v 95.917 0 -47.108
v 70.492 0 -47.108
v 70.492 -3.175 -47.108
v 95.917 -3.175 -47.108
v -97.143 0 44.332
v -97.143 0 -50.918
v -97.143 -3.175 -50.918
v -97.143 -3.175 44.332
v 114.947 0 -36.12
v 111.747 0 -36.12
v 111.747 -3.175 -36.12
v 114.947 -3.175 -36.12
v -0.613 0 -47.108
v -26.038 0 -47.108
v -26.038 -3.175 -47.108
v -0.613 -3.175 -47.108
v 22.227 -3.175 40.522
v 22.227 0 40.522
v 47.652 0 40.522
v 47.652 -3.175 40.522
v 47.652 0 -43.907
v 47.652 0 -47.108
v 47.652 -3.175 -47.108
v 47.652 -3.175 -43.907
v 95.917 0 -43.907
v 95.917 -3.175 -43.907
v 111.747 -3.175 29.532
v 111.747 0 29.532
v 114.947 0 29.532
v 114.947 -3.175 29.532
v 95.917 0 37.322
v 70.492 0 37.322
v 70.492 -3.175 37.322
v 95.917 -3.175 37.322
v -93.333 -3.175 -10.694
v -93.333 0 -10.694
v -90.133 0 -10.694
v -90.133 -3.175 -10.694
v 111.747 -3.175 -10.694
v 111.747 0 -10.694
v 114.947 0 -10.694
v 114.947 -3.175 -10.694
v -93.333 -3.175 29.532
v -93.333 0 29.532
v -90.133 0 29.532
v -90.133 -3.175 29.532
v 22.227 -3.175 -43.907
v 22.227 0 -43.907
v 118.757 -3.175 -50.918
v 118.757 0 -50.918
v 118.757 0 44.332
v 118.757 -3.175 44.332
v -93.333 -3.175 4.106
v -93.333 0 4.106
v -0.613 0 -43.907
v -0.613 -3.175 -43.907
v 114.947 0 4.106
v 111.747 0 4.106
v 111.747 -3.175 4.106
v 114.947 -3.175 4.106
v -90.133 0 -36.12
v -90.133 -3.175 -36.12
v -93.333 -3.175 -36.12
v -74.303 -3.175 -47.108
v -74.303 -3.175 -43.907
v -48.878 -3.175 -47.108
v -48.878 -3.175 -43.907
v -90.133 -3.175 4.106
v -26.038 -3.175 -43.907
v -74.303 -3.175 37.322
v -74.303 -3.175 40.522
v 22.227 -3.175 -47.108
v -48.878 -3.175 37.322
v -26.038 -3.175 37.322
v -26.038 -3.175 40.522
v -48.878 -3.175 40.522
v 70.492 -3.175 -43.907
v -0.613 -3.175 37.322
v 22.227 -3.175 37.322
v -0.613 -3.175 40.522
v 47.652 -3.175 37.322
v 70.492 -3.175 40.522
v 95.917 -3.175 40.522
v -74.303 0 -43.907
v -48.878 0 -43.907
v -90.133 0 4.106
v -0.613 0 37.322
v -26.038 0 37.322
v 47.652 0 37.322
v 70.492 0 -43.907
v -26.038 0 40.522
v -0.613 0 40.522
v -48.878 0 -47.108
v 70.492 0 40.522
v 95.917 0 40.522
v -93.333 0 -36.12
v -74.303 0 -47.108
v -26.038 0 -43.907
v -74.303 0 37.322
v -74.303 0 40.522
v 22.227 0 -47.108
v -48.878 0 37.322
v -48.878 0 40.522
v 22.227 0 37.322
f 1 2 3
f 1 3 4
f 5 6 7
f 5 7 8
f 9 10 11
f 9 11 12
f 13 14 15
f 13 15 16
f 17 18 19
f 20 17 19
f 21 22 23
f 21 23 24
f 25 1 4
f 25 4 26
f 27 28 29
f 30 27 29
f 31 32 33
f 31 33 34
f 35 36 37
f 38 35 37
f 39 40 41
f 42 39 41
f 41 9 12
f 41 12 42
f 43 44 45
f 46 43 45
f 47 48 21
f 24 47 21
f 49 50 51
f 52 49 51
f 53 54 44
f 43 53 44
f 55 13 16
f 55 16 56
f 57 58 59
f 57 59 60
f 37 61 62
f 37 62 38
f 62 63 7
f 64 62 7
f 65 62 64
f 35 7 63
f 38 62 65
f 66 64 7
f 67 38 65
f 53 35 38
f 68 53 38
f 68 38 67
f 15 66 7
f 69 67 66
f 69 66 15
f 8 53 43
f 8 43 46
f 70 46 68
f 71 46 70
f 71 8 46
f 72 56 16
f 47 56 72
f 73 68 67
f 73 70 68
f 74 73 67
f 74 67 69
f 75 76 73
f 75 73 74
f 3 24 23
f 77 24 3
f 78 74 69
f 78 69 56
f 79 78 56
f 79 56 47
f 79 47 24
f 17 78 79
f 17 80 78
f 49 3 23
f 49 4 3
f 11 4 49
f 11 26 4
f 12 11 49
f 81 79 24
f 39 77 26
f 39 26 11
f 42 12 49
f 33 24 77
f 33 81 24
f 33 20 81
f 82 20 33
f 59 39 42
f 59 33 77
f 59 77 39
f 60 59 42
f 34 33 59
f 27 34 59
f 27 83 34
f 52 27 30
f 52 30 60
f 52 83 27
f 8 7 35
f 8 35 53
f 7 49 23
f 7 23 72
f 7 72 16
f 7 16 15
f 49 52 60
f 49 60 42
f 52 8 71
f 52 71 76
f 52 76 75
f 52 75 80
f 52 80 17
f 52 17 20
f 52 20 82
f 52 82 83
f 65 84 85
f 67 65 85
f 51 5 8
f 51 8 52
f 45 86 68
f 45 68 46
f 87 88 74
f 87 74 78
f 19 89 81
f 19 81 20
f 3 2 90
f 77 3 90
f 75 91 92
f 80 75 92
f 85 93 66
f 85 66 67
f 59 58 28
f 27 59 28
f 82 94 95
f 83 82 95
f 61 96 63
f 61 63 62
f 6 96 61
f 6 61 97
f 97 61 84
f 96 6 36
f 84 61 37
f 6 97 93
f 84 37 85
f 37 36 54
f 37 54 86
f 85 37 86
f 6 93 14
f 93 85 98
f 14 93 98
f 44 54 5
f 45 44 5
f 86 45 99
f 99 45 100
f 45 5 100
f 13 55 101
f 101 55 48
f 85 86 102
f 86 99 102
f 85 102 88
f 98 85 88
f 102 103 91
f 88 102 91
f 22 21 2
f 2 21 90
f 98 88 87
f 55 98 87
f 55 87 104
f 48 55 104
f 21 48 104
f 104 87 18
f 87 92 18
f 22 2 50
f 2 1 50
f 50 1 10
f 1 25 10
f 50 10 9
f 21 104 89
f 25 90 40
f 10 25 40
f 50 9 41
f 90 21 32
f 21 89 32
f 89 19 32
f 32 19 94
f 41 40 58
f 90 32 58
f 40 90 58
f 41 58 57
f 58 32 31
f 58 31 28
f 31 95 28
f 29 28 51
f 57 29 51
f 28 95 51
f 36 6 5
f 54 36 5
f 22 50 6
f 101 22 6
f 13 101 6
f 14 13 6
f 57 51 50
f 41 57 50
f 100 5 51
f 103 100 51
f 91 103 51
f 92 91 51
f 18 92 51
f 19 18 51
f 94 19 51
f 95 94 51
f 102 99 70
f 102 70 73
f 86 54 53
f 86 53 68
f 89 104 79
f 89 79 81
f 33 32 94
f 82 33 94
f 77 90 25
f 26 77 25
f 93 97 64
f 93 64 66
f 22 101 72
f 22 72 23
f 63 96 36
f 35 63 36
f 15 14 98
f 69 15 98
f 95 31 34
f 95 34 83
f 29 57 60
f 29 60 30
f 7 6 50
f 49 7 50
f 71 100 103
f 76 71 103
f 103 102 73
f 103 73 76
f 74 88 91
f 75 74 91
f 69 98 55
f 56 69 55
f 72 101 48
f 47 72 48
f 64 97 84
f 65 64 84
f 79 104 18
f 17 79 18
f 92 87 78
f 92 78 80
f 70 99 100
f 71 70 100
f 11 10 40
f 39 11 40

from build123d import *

# Parameters (mm, degrees)
F0_W     = 215.9
F0_H     = 95.25
F0_W_2   = 25.4254
F0_H_2   = 3.2004
F0_W_3   = 3.2004
F0_H_3   = 25.4254
F1_DEPTH = 3.175


with BuildPart() as f1:
    # F0 (on Front) → F1 (new body)
    with BuildSketch(Plane.XZ):
        with Locations((10.806967, -3.292766)):
            Rectangle(F0_W, F0_H)
        with Locations((-61.590653, -45.507566)):
            Rectangle(F0_W_2, F0_H_2, mode=Mode.SUBTRACT)
        with Locations((-13.325573, -45.507566)):
            Rectangle(F0_W_2, F0_H_2, mode=Mode.SUBTRACT)
        with Locations((-91.732833, -23.407026)):
            Rectangle(F0_W_3, F0_H_3, mode=Mode.SUBTRACT)
        with Locations((34.939507, -45.507566)):
            Rectangle(F0_W_2, F0_H_2, mode=Mode.SUBTRACT)
        with Locations((83.204587, -45.507566)):
            Rectangle(F0_W_2, F0_H_2, mode=Mode.SUBTRACT)
        with Locations((113.346767, -23.407026)):
            Rectangle(F0_W_3, F0_H_3, mode=Mode.SUBTRACT)
        with Locations((-91.732833, 16.818954)):
            Rectangle(F0_W_3, F0_H_3, mode=Mode.SUBTRACT)
        with Locations((-61.590653, 38.922034)):
            Rectangle(F0_W_2, F0_H_2, mode=Mode.SUBTRACT)
        with Locations((-13.325573, 38.922034)):
            Rectangle(F0_W_2, F0_H_2, mode=Mode.SUBTRACT)
        with Locations((113.346767, 16.818954)):
            Rectangle(F0_W_3, F0_H_3, mode=Mode.SUBTRACT)
        with Locations((34.939507, 38.922034)):
            Rectangle(F0_W_2, F0_H_2, mode=Mode.SUBTRACT)
        with Locations((83.204587, 38.922034)):
            Rectangle(F0_W_2, F0_H_2, mode=Mode.SUBTRACT)
    extrude(amount=F1_DEPTH)


solid = f1.part
